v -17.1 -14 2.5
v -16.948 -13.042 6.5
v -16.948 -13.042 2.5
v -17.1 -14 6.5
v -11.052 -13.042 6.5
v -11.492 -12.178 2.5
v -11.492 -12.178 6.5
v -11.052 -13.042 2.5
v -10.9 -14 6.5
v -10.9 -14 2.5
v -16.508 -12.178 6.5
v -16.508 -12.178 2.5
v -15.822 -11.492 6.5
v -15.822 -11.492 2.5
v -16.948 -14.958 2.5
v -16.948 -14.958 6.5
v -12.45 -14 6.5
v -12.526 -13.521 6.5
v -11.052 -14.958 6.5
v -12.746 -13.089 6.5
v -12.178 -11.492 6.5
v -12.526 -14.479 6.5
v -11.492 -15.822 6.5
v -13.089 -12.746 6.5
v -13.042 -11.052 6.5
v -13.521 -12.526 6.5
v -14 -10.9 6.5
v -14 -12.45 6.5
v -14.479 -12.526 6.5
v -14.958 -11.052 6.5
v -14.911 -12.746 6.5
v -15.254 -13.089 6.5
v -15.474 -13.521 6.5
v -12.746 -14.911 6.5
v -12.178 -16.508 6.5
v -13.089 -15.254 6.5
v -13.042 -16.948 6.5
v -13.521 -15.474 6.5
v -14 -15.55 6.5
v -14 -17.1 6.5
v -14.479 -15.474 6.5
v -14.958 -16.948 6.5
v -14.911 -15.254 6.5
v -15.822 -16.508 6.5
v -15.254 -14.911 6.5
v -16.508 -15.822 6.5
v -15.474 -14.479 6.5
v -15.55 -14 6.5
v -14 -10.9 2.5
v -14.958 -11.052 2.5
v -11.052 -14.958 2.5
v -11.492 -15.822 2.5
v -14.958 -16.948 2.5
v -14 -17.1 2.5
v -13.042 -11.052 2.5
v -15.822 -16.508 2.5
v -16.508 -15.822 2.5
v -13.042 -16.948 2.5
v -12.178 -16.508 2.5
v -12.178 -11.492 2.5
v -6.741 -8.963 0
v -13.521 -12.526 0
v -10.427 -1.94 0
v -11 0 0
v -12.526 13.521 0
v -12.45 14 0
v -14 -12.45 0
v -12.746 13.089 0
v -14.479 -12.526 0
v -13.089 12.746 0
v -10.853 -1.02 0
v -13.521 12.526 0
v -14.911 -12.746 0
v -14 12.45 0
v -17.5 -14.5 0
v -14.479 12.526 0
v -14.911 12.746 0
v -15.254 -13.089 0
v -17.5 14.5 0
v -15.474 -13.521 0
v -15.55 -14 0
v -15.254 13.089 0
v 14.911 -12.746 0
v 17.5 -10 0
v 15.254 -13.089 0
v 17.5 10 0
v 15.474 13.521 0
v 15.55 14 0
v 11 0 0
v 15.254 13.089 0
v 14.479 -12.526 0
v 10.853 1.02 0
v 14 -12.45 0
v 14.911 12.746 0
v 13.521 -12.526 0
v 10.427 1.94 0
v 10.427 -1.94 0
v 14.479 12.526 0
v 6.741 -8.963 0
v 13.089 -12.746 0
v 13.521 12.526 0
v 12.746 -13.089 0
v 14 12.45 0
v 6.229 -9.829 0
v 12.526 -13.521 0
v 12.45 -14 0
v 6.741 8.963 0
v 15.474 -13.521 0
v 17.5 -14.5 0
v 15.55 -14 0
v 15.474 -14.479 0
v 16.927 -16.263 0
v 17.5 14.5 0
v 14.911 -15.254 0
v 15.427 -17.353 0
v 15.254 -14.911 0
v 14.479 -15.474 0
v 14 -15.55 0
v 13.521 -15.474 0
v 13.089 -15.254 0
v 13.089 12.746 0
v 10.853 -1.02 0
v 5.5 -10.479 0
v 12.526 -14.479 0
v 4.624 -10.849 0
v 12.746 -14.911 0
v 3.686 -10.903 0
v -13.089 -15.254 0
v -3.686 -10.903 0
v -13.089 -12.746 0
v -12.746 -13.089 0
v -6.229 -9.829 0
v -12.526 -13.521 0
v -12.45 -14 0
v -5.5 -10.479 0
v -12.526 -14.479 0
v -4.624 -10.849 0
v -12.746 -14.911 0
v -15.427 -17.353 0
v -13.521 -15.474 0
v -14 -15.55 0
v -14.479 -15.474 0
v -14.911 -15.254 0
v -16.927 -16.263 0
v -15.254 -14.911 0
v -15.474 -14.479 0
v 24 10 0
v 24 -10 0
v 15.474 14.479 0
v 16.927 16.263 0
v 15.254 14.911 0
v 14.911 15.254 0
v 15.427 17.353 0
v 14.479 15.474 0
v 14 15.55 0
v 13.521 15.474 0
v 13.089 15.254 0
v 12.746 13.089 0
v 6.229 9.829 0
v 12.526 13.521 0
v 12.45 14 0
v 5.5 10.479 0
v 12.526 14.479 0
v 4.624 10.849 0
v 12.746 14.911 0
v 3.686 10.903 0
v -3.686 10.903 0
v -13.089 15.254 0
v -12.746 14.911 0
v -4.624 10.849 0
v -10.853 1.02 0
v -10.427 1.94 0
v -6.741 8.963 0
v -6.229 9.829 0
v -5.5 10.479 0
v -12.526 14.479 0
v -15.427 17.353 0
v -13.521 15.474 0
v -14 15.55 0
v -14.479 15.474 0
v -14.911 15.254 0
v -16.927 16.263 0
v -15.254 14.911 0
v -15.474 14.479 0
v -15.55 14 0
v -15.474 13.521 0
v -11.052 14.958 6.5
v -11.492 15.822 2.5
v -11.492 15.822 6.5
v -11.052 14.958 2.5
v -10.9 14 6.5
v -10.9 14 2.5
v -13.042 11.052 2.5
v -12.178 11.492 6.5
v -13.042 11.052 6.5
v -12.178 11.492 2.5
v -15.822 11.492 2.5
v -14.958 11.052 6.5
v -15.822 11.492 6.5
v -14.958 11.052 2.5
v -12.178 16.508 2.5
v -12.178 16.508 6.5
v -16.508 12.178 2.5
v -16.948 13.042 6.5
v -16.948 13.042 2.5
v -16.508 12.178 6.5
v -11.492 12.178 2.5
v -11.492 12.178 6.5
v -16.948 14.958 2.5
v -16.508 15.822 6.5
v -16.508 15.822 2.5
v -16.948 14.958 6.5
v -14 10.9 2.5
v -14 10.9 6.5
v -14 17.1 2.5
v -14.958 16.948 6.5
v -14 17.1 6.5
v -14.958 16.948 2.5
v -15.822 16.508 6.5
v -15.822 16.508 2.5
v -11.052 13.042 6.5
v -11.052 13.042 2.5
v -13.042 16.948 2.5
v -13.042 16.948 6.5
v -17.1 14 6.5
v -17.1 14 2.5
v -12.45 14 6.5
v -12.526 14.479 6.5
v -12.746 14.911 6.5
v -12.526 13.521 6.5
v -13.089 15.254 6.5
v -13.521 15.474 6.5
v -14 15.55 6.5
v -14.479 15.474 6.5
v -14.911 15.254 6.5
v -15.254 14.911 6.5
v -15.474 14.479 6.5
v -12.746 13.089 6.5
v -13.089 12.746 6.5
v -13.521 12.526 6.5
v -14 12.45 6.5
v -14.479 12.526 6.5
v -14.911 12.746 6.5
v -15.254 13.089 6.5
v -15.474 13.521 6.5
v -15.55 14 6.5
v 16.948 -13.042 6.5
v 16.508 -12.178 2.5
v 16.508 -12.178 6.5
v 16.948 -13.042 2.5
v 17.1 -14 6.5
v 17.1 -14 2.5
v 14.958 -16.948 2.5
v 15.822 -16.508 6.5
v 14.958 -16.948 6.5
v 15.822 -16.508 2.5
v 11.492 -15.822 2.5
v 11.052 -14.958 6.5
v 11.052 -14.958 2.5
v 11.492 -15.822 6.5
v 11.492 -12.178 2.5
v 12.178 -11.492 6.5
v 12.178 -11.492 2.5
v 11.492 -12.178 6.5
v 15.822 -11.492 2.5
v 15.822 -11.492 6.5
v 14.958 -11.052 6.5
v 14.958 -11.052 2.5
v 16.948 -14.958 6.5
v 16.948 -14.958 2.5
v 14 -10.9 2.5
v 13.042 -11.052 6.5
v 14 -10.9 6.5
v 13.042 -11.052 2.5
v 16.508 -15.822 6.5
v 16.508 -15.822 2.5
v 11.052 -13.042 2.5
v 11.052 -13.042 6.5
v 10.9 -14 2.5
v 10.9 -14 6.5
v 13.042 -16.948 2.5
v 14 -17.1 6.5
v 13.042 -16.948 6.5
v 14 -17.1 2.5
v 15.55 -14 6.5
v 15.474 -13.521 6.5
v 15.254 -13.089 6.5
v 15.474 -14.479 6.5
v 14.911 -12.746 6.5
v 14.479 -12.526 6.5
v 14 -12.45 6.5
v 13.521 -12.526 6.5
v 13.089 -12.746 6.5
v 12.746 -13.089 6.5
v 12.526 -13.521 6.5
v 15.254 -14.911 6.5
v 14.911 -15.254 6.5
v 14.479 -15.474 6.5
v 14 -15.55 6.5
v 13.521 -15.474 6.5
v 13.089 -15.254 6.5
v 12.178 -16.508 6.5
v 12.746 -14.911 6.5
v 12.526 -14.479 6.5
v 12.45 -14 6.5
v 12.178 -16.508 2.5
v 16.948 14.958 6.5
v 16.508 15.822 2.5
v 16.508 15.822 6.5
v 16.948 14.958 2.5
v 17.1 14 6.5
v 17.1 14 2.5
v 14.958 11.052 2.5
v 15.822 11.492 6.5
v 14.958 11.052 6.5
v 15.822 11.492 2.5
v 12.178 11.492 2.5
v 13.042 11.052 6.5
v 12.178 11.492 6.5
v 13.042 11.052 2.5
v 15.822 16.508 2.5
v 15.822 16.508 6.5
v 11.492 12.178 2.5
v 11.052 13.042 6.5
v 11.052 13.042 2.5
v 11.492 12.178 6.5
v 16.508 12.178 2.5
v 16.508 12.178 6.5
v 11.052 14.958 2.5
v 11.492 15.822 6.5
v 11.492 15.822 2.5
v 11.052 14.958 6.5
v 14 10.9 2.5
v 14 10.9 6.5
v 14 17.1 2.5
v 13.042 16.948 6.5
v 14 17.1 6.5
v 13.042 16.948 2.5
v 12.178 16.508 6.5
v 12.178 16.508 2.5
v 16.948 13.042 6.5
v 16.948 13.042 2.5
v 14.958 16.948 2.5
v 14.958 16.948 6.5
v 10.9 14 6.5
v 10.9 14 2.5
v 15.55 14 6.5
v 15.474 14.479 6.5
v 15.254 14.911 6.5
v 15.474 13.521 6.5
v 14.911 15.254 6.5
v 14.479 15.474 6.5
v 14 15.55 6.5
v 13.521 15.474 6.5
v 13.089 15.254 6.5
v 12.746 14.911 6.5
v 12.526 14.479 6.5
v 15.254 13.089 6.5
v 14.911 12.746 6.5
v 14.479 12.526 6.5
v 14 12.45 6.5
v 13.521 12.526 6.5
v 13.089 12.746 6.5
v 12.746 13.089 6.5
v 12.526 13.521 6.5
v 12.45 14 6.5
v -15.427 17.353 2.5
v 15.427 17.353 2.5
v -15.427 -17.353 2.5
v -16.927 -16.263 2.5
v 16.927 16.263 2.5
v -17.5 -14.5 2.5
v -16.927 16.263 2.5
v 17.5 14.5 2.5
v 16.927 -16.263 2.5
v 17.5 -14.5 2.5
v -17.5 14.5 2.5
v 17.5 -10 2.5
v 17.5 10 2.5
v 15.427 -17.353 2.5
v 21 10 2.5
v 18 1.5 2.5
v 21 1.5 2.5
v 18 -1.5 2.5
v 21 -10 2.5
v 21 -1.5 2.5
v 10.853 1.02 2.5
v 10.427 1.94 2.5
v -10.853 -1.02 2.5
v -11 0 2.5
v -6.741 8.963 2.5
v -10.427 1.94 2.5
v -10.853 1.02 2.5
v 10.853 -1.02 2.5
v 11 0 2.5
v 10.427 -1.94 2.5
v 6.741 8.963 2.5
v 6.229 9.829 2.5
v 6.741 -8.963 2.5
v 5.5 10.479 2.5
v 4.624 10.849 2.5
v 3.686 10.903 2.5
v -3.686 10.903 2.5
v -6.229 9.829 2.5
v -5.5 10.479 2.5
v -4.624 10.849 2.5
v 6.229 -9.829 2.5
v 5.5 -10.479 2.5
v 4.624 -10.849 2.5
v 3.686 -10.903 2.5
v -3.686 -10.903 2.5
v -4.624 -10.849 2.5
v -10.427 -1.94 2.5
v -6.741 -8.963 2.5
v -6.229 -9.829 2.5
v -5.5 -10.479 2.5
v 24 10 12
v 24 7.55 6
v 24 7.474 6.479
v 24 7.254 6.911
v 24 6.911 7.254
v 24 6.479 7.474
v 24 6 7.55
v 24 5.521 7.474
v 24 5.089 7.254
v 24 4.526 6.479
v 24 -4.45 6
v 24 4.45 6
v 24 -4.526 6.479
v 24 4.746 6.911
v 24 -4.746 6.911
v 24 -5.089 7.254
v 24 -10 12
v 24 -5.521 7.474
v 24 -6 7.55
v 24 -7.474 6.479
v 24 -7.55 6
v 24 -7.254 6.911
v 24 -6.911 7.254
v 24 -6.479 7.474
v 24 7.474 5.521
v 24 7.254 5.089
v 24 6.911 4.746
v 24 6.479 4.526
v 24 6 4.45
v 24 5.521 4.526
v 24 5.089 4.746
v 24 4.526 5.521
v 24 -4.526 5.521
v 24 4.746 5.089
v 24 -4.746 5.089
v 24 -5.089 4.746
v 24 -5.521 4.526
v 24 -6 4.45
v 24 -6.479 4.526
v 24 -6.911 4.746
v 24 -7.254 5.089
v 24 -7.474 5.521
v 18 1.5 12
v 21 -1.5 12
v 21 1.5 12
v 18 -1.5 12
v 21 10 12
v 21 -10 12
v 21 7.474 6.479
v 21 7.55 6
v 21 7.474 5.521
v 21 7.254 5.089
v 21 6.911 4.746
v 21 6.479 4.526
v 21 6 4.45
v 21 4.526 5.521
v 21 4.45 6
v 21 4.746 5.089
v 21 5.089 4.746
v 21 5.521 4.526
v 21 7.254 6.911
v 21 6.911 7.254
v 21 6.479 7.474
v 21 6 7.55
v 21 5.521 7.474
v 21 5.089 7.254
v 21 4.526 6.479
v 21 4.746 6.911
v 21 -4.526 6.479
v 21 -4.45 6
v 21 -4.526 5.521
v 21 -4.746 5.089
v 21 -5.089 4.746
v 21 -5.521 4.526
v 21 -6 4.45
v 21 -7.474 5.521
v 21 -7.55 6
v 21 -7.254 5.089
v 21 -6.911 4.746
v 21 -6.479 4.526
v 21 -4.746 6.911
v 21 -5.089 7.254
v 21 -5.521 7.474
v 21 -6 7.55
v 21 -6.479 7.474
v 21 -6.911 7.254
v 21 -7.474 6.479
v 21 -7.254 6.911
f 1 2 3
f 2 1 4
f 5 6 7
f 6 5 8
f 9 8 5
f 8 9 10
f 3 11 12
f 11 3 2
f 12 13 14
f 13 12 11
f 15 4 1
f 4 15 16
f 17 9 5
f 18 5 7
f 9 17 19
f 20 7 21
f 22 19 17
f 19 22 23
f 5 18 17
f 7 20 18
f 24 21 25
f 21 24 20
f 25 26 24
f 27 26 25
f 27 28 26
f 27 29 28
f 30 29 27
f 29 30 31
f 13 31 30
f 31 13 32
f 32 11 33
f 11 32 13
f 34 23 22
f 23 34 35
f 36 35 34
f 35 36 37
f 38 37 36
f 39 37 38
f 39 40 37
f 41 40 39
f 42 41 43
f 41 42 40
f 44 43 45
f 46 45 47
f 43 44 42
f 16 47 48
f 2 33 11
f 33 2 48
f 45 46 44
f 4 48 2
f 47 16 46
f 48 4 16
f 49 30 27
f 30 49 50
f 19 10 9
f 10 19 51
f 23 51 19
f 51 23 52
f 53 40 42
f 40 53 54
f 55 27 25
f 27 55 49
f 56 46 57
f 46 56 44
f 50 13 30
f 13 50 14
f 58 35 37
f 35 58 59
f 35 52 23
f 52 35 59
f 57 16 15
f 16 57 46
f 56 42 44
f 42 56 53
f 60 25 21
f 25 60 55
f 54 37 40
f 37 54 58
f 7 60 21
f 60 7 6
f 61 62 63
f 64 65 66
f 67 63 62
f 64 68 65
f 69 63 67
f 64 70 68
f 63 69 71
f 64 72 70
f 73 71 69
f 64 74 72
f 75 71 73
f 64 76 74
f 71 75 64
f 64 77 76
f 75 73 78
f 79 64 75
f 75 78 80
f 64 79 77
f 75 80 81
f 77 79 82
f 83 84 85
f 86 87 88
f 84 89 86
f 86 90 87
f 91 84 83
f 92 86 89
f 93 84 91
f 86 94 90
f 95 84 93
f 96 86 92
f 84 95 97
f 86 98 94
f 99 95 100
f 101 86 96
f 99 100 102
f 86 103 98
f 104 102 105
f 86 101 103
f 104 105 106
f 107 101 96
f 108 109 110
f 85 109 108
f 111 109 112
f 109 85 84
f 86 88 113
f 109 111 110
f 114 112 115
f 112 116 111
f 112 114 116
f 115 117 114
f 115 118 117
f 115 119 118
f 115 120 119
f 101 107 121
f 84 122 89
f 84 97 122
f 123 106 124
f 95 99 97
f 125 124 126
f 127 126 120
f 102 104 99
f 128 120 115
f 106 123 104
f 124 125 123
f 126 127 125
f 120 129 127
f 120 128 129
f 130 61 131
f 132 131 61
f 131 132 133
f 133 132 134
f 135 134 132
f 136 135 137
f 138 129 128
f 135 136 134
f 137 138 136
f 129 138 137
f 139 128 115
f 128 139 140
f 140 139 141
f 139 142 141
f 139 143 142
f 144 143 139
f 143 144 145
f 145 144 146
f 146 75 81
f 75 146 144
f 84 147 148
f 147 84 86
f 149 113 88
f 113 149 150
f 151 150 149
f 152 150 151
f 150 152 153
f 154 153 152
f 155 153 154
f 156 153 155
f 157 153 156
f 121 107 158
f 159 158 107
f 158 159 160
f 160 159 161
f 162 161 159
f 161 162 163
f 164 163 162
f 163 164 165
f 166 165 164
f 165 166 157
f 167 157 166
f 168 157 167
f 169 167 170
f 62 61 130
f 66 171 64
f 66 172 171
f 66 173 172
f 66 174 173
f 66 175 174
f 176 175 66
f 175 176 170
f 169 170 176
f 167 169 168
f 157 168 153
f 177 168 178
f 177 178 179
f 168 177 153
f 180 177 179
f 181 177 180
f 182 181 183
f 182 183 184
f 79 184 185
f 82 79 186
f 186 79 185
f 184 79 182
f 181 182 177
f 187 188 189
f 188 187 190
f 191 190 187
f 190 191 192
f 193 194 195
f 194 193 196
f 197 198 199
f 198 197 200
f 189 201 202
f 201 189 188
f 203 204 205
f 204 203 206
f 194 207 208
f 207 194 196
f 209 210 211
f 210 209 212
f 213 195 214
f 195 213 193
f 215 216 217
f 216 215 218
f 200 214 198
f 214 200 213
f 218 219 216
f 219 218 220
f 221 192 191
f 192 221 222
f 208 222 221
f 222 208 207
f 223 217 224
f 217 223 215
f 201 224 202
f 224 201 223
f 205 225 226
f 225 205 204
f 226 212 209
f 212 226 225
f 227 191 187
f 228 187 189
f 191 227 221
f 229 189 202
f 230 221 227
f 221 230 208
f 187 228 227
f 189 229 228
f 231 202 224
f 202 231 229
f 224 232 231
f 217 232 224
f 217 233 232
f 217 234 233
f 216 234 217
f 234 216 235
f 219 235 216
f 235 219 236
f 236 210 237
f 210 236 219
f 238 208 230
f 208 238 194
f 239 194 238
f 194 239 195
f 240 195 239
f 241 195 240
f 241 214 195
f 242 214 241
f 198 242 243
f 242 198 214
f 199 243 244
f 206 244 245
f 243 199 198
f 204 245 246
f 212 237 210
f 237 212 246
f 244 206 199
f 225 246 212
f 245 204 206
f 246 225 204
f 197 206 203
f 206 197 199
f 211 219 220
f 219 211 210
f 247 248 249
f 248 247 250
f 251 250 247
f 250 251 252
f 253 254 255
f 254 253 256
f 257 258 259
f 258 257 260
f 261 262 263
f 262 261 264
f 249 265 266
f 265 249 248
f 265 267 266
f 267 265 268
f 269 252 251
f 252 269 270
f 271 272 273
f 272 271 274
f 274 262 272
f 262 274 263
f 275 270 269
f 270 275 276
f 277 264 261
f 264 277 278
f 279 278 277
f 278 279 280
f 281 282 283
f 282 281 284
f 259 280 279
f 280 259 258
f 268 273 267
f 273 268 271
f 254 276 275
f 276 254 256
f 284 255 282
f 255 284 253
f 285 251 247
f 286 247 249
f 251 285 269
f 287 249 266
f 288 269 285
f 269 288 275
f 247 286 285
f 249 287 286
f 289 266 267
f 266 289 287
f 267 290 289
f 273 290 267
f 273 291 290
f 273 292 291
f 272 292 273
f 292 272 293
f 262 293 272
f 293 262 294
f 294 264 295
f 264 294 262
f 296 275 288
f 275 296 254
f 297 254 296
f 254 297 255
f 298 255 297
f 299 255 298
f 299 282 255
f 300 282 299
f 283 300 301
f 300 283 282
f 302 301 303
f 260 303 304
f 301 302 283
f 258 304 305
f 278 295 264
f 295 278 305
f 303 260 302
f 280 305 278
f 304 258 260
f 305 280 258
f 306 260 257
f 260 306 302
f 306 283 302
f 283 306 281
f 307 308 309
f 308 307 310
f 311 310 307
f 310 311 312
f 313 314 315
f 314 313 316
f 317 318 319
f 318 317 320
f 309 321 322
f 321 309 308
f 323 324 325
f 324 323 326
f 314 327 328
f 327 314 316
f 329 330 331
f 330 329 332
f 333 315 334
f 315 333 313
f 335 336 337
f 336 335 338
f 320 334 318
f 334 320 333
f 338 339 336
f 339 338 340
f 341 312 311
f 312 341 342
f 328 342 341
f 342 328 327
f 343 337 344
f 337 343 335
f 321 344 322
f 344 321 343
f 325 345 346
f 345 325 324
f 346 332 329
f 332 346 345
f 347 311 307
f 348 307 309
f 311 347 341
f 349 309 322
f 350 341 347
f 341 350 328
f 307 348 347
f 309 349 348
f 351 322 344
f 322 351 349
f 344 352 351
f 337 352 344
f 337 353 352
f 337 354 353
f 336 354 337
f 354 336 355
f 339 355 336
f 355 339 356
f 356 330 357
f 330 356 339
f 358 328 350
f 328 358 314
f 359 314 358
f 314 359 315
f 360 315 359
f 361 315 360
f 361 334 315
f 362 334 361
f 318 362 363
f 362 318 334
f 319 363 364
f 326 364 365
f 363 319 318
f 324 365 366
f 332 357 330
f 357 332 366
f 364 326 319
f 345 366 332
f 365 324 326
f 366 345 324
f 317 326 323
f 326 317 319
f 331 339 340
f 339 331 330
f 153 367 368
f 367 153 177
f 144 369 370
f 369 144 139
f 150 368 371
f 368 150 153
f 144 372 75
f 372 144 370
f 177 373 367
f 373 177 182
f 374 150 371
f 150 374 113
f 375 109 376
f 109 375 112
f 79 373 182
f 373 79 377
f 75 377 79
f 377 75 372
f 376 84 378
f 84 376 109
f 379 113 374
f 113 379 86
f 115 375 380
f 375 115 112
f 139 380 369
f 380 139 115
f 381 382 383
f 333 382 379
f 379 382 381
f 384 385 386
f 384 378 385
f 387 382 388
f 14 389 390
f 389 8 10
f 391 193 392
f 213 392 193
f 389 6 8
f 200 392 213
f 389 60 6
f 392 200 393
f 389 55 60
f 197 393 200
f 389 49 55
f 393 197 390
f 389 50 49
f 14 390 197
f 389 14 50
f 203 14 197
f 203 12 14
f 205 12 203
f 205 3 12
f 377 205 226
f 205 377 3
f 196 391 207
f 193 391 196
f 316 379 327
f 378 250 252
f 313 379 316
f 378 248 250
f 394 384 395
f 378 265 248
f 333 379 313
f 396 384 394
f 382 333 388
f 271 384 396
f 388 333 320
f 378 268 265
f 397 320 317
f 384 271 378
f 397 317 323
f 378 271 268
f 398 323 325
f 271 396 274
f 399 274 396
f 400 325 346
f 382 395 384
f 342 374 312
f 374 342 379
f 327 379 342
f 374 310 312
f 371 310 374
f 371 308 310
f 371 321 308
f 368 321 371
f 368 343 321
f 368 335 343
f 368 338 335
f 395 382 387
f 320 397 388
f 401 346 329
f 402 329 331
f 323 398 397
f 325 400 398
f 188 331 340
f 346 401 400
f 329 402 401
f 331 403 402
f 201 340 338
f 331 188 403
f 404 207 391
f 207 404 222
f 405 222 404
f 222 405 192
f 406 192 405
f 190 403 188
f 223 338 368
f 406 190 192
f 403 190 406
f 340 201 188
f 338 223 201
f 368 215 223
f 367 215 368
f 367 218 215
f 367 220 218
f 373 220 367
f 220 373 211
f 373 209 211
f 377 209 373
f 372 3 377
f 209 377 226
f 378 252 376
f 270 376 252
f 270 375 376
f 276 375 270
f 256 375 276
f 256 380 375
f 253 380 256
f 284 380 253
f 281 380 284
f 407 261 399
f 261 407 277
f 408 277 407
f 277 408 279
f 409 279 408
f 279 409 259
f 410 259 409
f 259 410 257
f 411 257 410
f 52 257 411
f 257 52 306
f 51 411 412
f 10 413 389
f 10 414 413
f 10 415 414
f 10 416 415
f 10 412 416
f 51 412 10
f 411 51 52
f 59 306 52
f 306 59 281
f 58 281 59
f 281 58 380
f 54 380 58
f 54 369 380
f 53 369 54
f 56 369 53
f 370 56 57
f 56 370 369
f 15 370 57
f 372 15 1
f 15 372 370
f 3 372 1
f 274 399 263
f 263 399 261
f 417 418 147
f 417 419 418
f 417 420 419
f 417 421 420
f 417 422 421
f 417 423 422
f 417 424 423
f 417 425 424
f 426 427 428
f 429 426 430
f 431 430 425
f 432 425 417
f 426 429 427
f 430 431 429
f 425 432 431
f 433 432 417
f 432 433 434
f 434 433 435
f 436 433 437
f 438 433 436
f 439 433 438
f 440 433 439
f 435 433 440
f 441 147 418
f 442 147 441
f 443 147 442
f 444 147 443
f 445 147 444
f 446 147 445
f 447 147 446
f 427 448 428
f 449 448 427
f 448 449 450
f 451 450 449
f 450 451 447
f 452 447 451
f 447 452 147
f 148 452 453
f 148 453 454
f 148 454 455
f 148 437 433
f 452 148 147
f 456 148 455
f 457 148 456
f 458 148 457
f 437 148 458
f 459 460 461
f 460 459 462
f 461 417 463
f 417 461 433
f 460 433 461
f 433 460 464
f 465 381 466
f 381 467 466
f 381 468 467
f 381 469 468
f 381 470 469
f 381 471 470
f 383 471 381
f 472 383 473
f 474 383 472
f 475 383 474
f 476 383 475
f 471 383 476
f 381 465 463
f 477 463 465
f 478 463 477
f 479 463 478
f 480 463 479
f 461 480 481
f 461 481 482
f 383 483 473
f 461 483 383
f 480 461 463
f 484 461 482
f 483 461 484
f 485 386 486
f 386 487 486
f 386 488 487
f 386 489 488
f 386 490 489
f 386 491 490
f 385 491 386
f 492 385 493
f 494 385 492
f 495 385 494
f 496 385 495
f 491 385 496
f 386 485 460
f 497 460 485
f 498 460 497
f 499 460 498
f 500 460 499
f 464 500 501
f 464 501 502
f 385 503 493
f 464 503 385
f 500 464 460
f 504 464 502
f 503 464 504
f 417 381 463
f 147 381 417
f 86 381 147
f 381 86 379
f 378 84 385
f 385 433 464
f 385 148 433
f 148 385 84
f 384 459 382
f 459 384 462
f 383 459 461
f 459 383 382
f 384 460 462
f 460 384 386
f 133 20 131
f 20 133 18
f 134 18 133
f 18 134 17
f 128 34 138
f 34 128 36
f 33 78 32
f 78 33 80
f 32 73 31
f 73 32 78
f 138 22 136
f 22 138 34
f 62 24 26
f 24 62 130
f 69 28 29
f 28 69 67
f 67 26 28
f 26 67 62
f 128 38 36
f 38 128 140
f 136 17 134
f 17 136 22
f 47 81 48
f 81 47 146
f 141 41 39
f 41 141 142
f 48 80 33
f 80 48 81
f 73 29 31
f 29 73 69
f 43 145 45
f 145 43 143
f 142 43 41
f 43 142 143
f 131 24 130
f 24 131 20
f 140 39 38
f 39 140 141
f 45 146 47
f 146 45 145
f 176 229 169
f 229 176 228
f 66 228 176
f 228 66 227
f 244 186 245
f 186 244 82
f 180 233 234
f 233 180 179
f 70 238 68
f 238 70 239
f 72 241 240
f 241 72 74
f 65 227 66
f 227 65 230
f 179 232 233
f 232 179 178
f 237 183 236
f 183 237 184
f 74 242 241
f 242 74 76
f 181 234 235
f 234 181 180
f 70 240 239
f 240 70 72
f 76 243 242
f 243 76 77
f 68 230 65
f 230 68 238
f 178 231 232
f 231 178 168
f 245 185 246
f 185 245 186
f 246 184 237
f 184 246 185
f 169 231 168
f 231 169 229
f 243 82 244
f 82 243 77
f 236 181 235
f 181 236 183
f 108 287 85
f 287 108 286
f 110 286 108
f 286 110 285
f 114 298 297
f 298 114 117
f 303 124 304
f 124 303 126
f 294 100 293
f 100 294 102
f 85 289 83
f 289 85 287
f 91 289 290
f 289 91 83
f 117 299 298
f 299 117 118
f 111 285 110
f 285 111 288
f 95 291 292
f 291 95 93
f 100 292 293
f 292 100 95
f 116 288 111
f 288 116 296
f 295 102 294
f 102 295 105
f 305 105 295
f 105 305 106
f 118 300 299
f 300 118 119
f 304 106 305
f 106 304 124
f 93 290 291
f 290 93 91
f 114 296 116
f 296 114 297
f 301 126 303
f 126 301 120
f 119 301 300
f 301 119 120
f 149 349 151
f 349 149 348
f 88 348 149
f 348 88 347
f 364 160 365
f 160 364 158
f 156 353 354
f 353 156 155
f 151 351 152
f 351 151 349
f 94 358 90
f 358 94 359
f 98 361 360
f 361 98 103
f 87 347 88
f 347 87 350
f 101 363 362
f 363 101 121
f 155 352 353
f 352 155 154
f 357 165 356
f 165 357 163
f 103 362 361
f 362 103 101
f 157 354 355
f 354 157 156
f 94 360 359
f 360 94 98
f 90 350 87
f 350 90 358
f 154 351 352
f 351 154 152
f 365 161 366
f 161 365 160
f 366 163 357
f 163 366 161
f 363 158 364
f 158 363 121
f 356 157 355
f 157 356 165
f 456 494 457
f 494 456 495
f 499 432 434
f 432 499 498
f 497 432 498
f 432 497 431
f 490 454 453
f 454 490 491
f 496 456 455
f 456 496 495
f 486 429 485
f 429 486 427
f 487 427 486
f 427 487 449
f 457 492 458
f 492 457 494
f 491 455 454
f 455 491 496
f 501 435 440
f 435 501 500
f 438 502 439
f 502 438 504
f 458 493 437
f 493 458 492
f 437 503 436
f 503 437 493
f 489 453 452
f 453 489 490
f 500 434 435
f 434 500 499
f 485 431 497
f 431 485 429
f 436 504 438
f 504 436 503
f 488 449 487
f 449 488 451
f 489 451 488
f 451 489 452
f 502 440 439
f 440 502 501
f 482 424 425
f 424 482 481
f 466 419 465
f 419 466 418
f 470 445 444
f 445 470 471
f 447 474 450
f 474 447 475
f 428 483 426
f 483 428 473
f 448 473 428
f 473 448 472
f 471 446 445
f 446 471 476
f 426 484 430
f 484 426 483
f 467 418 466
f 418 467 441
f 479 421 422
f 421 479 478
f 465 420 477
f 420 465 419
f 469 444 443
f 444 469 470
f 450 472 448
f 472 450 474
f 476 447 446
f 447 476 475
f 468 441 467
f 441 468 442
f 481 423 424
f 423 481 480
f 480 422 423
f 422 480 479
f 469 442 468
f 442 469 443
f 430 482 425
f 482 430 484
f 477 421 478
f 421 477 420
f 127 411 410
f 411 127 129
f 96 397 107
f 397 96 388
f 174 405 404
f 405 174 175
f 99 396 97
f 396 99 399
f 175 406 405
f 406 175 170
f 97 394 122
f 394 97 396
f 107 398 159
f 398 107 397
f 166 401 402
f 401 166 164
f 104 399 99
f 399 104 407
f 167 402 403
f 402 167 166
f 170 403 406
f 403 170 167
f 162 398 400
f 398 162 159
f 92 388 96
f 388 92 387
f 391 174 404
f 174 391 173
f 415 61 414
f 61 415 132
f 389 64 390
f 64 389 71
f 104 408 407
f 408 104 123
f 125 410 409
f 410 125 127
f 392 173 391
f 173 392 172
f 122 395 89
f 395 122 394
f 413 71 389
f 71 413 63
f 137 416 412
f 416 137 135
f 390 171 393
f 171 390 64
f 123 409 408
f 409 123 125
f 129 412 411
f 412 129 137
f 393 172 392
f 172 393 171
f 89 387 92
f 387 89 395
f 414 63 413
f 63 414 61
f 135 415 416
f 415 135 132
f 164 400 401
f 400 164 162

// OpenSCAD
// file: dronePlates.scad
/**
 * dronePlates.scad
 * Plate library
 *
 * GNU GPL V3
 * @author: Victor Potenciano
 */

m3Rad = 3.4/2;
cornerR = 4;

/**
 *
 */
module helperDisk(diameter) {
	cylinder(r = diameter/2, h = 0.6, $fn=20);
}

/**
 *
 */
module roundedRect(size, radius) {
	x = size[0];
	y = size[1];
	z = size[2];

	linear_extrude(height=z)
	hull() {
	// place 4 circles in the corners, with the given radius
	translate([(-x/2)+(radius/2), (-y/2)+(radius/2), 0]){ circle(r=radius); }
	translate([(x/2)-(radius/2), (-y/2)+(radius/2), 0]){ circle(r=radius); }
	translate([(-x/2)+(radius/2), (y/2)-(radius/2), 0]){ circle(r=radius); }
	translate([(x/2)-(radius/2), (y/2)-(radius/2), 0]){ circle(r=radius); }
	}
}

/**
 * rounded rectangle triangle with corner at origin
 */
module roundedTriangle(size, radius) {
	x = size[0];
	y = size[1];
	z = size[2];

	linear_extrude(height=z)
	hull() {
	translate([radius, radius, 0]){ circle(r=radius); }
	translate([x-radius, radius, 0]){ circle(r=radius); }
	translate([radius, y-radius, 0]){ circle(r=radius); }
	}
}

/**
 *
 */
module roundRectPlate(w, l, plateThick=3) {
	difference(){
		roundedRect([l+m3Rad*1.75,w+m3Rad*1.75,plateThick], cornerR);
		translate([l/2, w/2, -0.5]) { cylinder(h = plateThick+1, r = m3Rad, $fn=30); }
		translate([-l/2, w/2, -0.5]) { cylinder(h = plateThick+1, r = m3Rad, $fn=30); }
		translate([l/2, -w/2, -0.5]) { cylinder(h = plateThick+1, r = m3Rad, $fn=30); }
		translate([-l/2, -w/2, -0.5]) { cylinder(h = plateThick+1, r = m3Rad, $fn=30); }
	}
}

/**
 *
 */
module crossSquarePlate(l, thick=3) {
	inDist = cornerR*2+4;
	trianL = sqrt((l*l)/2)-inDist;
	centerR = 4;

	difference(){
		roundRectPlate(l, l, thick);
		translate([0, centerR, -0.5]) { 
			rotate([0,0,45]){ roundedTriangle([trianL,trianL,thick+1], cornerR-2); }
		}
		translate([0, -centerR, -0.5]) { 
			rotate([0,0,225]){ roundedTriangle([trianL,trianL,thick+1], cornerR-2); }
		}
		translate([-centerR, 0, -0.5]) { 
			rotate([0,0,135]){ roundedTriangle([trianL,trianL,thick+1], cornerR-2); }
		}
		translate([centerR, 0, -0.5]) { 
			rotate([0,0,-45]){ roundedTriangle([trianL,trianL,thick+1], cornerR-2); }
		}
	}
}

/**
 *
 */
module hShapePlate(w, l, thick=4) {
	inDist = cornerR*2+1;

	difference(){
		roundRectPlate(w, l, thick);
		translate([0, w/4, -0.5]) { roundedRect([l-inDist,w/2-inDist,thick+1], cornerR-2); }
		translate([0, -w/4, -0.5]) { roundedRect([l-inDist,w/2-inDist,thick+1], cornerR-2); }
	}
}

/**
 *
 */
module motorCircleMount(inDia, outDia, thick=3, extraH=false, d1=19, d2=16, holeR=m3Rad ) {
	difference(){
		cylinder(h = thick, r = outDia/2, $fn=30);
		motorCircleMountHoles(inDia, outDia, thick, extraH, d1=d1, d2=d2, holeR=holeR);
	}
}

/**
 *
 */
module motorCircleMountHoles(inDia, outDia, thick=3, extraH=false, d1=19, d2=16, d3=25, holeR=m3Rad) {
	translate([0, 0, -0.5]) { cylinder(h = thick+1, r = inDia/2, $fn=30); }

	for(i=[0:3]) {
		rotate([0,0,90*i]){
		translate([d1/2, 0, -0.5]) cylinder(h = thick+1, r = holeR, $fn=20);
		translate([d2/2, 0, -0.5]) cylinder(h = thick+1, r = holeR, $fn=20);
		translate([d2/2, -holeR, -0.5]) cube(size = [(d1-d2)/2,holeR*2,thick+1]);
		}
	}
	
	if(extraH==true){	
		for(i=[-1,1]) translate([i*d3/2, 0, -0.5]) { cylinder(h = thick+1, r = holeR, $fn=30); }
	}
}

/**
 *
 */
module motorRectMount(w, l, inDia, thick=3) {
	d1=19;
	d2=16;

	difference(){
		roundRectPlate(w, l, thick);
		translate([0, 0, -0.5]) { cylinder(h = thick+1, r = inDia/2, $fn=30); }
		translate([0, d1/2, -0.5]) { cylinder(h = thick+1, r = m3Rad, $fn=30); }
		translate([0, -d1/2, -0.5]) { cylinder(h = thick+1, r = m3Rad, $fn=30); }
		translate([d2/2, 0, -0.5]) { cylinder(h = thick+1, r = m3Rad, $fn=30); }
		translate([-d2/2, 0, -0.5]) { cylinder(h = thick+1, r = m3Rad, $fn=30); }
	}
}

/**
 *
 */
module tube(inDia, outDia, height) {
	difference(){
		cylinder(h = height, r = outDia/2, $fn=50);
		translate([0, 0, -0.5]) { cylinder(h = height+1, r = inDia/2, $fn=30); }
	}
}

/**
 *
 */
module squareTube(inDia, outDia, height) {
	translate([0,0,height/2]){
	difference(){
		cube(size = [outDia,outDia,height], center = true);
		cube(size = [inDia,inDia,height+1], center = true);
	}
	}
}

/**
 *
 */
module djiFlamewheelHoles(height) {
	a = 23;
	b = 16;
	c = 19.5;
	
	translate([a/2, c/2, 0]) { cylinder(h = height, r = m3Rad, $fn=30); }
	translate([-a/2, c/2, 0]) { cylinder(h = height, r = m3Rad, $fn=30); }
	translate([b/2, -c/2, 0]) { cylinder(h = height, r = m3Rad, $fn=30); }
	translate([-b/2, -c/2, 0]) { cylinder(h = height, r = m3Rad, $fn=30); }
}

/**
 *
 */
module djiFlamewheelHolesBotton(height) {
	a1 = 21;
	c = 19.5;
	
	translate([a1/2, c/2, 0]) { cylinder(h = height, r = m3Rad, $fn=30); }
	translate([-a1/2, c/2, 0]) { cylinder(h = height, r = m3Rad, $fn=30); }
}

/**
 *
 */
module propeller(size){
union(){
difference(){
	cylinder(h = 3, r = size/2, center=true, $fn=30);
	cylinder(h = 3.1, r = size/2-2, center=true, $fn=30); 
}
for( i = [-1,1] ){
rotate([0,0,45*i]){ cube(size = [size,4,1], center = true); }
}
}
}

/**
 *
 */
module slot(length, height, rad){
for(i=[-1,1]) translate([i*length/2,0,0]) cylinder(h = height, r = rad, $fn=30);
translate([0,0,height/2]) cube(size = [length,rad*2,height], center = true);
}

 

////////////////////////
// Examples:
////////////////////////

motorCircleMount(8, 25, 3.5);

//roundedRect([50,50,3], 4);

//hShapePlate(79, 25);

//rotate([0,0,45]){roundedTriangle([40,40,3], 4);}

//crossSquarePlate(45, 4);

/*
union(){
motorRectMount(21, 18, 8, 4);
translate([9, 10.5, 0]) {tube(m3Rad*2, 6.5, 6);}
}
*/

/*
difference(){
union(){
hShapePlate(50, 30, 3.5);
translate([-4,-25,0]){cube(size = [8,50,3.5]);}
rotate([0, 0, 45]) {motorCircleMount(8, 35, 3.5);}
}
cylinder(h = 10, r = 4, $fn=100, center=true);
}
*/

//rotate([90,0,0]){ tube(5,10,20); }
//translate([20,0,0]){ squareTube(5, 10, 20); }
// main file
/**
 *
 */

use <dronePlates.scad>

m3Rad = 3.1/2;
plateThick = 2.5;
shift=28;

/**
 *
 */
module hexagon(rad, cornerR, thick) {
hull(){
	for(i=[0:5]){
	rotate([0,0,60*i]) translate([rad,0,0]) cylinder(r=cornerR, h=thick, $fn=20);
	}
}
}//end module hexagon


difference(){
    union(){
    roundedRect([shift+4,shift+4,plateThick],3);
    for(i=[-1,1]) for(j=[-1,1]){
    translate([i*shift/2,j*shift/2,0]) cylinder(r=m3Rad*2, h=plateThick+4, $fn=20);
    }
    
    translate([shift/2+7,-20/2,0]) cube(size=[3,20,12]);
    translate([shift/2+4,-3/2,0]) cube(size=[4,3,12]);
    translate([shift/2,-20/2,0]) cube(size=[8,20,plateThick]);
    }
    
    scale([1,1.1,1]) hexagon(8, 3, plateThick+1);
    
    for(i=[-1,1]) for(j=[-1,1]){
    translate([i*shift/2,j*shift/2,-0.5]) cylinder(r=m3Rad, h=plateThick+6, $fn=20);
    }
    
    for(i=[-1,1]) translate([shift/2+5,i*6,6]) rotate([0,90,0]) cylinder(r=m3Rad, h=plateThick+6, $fn=20);
}
